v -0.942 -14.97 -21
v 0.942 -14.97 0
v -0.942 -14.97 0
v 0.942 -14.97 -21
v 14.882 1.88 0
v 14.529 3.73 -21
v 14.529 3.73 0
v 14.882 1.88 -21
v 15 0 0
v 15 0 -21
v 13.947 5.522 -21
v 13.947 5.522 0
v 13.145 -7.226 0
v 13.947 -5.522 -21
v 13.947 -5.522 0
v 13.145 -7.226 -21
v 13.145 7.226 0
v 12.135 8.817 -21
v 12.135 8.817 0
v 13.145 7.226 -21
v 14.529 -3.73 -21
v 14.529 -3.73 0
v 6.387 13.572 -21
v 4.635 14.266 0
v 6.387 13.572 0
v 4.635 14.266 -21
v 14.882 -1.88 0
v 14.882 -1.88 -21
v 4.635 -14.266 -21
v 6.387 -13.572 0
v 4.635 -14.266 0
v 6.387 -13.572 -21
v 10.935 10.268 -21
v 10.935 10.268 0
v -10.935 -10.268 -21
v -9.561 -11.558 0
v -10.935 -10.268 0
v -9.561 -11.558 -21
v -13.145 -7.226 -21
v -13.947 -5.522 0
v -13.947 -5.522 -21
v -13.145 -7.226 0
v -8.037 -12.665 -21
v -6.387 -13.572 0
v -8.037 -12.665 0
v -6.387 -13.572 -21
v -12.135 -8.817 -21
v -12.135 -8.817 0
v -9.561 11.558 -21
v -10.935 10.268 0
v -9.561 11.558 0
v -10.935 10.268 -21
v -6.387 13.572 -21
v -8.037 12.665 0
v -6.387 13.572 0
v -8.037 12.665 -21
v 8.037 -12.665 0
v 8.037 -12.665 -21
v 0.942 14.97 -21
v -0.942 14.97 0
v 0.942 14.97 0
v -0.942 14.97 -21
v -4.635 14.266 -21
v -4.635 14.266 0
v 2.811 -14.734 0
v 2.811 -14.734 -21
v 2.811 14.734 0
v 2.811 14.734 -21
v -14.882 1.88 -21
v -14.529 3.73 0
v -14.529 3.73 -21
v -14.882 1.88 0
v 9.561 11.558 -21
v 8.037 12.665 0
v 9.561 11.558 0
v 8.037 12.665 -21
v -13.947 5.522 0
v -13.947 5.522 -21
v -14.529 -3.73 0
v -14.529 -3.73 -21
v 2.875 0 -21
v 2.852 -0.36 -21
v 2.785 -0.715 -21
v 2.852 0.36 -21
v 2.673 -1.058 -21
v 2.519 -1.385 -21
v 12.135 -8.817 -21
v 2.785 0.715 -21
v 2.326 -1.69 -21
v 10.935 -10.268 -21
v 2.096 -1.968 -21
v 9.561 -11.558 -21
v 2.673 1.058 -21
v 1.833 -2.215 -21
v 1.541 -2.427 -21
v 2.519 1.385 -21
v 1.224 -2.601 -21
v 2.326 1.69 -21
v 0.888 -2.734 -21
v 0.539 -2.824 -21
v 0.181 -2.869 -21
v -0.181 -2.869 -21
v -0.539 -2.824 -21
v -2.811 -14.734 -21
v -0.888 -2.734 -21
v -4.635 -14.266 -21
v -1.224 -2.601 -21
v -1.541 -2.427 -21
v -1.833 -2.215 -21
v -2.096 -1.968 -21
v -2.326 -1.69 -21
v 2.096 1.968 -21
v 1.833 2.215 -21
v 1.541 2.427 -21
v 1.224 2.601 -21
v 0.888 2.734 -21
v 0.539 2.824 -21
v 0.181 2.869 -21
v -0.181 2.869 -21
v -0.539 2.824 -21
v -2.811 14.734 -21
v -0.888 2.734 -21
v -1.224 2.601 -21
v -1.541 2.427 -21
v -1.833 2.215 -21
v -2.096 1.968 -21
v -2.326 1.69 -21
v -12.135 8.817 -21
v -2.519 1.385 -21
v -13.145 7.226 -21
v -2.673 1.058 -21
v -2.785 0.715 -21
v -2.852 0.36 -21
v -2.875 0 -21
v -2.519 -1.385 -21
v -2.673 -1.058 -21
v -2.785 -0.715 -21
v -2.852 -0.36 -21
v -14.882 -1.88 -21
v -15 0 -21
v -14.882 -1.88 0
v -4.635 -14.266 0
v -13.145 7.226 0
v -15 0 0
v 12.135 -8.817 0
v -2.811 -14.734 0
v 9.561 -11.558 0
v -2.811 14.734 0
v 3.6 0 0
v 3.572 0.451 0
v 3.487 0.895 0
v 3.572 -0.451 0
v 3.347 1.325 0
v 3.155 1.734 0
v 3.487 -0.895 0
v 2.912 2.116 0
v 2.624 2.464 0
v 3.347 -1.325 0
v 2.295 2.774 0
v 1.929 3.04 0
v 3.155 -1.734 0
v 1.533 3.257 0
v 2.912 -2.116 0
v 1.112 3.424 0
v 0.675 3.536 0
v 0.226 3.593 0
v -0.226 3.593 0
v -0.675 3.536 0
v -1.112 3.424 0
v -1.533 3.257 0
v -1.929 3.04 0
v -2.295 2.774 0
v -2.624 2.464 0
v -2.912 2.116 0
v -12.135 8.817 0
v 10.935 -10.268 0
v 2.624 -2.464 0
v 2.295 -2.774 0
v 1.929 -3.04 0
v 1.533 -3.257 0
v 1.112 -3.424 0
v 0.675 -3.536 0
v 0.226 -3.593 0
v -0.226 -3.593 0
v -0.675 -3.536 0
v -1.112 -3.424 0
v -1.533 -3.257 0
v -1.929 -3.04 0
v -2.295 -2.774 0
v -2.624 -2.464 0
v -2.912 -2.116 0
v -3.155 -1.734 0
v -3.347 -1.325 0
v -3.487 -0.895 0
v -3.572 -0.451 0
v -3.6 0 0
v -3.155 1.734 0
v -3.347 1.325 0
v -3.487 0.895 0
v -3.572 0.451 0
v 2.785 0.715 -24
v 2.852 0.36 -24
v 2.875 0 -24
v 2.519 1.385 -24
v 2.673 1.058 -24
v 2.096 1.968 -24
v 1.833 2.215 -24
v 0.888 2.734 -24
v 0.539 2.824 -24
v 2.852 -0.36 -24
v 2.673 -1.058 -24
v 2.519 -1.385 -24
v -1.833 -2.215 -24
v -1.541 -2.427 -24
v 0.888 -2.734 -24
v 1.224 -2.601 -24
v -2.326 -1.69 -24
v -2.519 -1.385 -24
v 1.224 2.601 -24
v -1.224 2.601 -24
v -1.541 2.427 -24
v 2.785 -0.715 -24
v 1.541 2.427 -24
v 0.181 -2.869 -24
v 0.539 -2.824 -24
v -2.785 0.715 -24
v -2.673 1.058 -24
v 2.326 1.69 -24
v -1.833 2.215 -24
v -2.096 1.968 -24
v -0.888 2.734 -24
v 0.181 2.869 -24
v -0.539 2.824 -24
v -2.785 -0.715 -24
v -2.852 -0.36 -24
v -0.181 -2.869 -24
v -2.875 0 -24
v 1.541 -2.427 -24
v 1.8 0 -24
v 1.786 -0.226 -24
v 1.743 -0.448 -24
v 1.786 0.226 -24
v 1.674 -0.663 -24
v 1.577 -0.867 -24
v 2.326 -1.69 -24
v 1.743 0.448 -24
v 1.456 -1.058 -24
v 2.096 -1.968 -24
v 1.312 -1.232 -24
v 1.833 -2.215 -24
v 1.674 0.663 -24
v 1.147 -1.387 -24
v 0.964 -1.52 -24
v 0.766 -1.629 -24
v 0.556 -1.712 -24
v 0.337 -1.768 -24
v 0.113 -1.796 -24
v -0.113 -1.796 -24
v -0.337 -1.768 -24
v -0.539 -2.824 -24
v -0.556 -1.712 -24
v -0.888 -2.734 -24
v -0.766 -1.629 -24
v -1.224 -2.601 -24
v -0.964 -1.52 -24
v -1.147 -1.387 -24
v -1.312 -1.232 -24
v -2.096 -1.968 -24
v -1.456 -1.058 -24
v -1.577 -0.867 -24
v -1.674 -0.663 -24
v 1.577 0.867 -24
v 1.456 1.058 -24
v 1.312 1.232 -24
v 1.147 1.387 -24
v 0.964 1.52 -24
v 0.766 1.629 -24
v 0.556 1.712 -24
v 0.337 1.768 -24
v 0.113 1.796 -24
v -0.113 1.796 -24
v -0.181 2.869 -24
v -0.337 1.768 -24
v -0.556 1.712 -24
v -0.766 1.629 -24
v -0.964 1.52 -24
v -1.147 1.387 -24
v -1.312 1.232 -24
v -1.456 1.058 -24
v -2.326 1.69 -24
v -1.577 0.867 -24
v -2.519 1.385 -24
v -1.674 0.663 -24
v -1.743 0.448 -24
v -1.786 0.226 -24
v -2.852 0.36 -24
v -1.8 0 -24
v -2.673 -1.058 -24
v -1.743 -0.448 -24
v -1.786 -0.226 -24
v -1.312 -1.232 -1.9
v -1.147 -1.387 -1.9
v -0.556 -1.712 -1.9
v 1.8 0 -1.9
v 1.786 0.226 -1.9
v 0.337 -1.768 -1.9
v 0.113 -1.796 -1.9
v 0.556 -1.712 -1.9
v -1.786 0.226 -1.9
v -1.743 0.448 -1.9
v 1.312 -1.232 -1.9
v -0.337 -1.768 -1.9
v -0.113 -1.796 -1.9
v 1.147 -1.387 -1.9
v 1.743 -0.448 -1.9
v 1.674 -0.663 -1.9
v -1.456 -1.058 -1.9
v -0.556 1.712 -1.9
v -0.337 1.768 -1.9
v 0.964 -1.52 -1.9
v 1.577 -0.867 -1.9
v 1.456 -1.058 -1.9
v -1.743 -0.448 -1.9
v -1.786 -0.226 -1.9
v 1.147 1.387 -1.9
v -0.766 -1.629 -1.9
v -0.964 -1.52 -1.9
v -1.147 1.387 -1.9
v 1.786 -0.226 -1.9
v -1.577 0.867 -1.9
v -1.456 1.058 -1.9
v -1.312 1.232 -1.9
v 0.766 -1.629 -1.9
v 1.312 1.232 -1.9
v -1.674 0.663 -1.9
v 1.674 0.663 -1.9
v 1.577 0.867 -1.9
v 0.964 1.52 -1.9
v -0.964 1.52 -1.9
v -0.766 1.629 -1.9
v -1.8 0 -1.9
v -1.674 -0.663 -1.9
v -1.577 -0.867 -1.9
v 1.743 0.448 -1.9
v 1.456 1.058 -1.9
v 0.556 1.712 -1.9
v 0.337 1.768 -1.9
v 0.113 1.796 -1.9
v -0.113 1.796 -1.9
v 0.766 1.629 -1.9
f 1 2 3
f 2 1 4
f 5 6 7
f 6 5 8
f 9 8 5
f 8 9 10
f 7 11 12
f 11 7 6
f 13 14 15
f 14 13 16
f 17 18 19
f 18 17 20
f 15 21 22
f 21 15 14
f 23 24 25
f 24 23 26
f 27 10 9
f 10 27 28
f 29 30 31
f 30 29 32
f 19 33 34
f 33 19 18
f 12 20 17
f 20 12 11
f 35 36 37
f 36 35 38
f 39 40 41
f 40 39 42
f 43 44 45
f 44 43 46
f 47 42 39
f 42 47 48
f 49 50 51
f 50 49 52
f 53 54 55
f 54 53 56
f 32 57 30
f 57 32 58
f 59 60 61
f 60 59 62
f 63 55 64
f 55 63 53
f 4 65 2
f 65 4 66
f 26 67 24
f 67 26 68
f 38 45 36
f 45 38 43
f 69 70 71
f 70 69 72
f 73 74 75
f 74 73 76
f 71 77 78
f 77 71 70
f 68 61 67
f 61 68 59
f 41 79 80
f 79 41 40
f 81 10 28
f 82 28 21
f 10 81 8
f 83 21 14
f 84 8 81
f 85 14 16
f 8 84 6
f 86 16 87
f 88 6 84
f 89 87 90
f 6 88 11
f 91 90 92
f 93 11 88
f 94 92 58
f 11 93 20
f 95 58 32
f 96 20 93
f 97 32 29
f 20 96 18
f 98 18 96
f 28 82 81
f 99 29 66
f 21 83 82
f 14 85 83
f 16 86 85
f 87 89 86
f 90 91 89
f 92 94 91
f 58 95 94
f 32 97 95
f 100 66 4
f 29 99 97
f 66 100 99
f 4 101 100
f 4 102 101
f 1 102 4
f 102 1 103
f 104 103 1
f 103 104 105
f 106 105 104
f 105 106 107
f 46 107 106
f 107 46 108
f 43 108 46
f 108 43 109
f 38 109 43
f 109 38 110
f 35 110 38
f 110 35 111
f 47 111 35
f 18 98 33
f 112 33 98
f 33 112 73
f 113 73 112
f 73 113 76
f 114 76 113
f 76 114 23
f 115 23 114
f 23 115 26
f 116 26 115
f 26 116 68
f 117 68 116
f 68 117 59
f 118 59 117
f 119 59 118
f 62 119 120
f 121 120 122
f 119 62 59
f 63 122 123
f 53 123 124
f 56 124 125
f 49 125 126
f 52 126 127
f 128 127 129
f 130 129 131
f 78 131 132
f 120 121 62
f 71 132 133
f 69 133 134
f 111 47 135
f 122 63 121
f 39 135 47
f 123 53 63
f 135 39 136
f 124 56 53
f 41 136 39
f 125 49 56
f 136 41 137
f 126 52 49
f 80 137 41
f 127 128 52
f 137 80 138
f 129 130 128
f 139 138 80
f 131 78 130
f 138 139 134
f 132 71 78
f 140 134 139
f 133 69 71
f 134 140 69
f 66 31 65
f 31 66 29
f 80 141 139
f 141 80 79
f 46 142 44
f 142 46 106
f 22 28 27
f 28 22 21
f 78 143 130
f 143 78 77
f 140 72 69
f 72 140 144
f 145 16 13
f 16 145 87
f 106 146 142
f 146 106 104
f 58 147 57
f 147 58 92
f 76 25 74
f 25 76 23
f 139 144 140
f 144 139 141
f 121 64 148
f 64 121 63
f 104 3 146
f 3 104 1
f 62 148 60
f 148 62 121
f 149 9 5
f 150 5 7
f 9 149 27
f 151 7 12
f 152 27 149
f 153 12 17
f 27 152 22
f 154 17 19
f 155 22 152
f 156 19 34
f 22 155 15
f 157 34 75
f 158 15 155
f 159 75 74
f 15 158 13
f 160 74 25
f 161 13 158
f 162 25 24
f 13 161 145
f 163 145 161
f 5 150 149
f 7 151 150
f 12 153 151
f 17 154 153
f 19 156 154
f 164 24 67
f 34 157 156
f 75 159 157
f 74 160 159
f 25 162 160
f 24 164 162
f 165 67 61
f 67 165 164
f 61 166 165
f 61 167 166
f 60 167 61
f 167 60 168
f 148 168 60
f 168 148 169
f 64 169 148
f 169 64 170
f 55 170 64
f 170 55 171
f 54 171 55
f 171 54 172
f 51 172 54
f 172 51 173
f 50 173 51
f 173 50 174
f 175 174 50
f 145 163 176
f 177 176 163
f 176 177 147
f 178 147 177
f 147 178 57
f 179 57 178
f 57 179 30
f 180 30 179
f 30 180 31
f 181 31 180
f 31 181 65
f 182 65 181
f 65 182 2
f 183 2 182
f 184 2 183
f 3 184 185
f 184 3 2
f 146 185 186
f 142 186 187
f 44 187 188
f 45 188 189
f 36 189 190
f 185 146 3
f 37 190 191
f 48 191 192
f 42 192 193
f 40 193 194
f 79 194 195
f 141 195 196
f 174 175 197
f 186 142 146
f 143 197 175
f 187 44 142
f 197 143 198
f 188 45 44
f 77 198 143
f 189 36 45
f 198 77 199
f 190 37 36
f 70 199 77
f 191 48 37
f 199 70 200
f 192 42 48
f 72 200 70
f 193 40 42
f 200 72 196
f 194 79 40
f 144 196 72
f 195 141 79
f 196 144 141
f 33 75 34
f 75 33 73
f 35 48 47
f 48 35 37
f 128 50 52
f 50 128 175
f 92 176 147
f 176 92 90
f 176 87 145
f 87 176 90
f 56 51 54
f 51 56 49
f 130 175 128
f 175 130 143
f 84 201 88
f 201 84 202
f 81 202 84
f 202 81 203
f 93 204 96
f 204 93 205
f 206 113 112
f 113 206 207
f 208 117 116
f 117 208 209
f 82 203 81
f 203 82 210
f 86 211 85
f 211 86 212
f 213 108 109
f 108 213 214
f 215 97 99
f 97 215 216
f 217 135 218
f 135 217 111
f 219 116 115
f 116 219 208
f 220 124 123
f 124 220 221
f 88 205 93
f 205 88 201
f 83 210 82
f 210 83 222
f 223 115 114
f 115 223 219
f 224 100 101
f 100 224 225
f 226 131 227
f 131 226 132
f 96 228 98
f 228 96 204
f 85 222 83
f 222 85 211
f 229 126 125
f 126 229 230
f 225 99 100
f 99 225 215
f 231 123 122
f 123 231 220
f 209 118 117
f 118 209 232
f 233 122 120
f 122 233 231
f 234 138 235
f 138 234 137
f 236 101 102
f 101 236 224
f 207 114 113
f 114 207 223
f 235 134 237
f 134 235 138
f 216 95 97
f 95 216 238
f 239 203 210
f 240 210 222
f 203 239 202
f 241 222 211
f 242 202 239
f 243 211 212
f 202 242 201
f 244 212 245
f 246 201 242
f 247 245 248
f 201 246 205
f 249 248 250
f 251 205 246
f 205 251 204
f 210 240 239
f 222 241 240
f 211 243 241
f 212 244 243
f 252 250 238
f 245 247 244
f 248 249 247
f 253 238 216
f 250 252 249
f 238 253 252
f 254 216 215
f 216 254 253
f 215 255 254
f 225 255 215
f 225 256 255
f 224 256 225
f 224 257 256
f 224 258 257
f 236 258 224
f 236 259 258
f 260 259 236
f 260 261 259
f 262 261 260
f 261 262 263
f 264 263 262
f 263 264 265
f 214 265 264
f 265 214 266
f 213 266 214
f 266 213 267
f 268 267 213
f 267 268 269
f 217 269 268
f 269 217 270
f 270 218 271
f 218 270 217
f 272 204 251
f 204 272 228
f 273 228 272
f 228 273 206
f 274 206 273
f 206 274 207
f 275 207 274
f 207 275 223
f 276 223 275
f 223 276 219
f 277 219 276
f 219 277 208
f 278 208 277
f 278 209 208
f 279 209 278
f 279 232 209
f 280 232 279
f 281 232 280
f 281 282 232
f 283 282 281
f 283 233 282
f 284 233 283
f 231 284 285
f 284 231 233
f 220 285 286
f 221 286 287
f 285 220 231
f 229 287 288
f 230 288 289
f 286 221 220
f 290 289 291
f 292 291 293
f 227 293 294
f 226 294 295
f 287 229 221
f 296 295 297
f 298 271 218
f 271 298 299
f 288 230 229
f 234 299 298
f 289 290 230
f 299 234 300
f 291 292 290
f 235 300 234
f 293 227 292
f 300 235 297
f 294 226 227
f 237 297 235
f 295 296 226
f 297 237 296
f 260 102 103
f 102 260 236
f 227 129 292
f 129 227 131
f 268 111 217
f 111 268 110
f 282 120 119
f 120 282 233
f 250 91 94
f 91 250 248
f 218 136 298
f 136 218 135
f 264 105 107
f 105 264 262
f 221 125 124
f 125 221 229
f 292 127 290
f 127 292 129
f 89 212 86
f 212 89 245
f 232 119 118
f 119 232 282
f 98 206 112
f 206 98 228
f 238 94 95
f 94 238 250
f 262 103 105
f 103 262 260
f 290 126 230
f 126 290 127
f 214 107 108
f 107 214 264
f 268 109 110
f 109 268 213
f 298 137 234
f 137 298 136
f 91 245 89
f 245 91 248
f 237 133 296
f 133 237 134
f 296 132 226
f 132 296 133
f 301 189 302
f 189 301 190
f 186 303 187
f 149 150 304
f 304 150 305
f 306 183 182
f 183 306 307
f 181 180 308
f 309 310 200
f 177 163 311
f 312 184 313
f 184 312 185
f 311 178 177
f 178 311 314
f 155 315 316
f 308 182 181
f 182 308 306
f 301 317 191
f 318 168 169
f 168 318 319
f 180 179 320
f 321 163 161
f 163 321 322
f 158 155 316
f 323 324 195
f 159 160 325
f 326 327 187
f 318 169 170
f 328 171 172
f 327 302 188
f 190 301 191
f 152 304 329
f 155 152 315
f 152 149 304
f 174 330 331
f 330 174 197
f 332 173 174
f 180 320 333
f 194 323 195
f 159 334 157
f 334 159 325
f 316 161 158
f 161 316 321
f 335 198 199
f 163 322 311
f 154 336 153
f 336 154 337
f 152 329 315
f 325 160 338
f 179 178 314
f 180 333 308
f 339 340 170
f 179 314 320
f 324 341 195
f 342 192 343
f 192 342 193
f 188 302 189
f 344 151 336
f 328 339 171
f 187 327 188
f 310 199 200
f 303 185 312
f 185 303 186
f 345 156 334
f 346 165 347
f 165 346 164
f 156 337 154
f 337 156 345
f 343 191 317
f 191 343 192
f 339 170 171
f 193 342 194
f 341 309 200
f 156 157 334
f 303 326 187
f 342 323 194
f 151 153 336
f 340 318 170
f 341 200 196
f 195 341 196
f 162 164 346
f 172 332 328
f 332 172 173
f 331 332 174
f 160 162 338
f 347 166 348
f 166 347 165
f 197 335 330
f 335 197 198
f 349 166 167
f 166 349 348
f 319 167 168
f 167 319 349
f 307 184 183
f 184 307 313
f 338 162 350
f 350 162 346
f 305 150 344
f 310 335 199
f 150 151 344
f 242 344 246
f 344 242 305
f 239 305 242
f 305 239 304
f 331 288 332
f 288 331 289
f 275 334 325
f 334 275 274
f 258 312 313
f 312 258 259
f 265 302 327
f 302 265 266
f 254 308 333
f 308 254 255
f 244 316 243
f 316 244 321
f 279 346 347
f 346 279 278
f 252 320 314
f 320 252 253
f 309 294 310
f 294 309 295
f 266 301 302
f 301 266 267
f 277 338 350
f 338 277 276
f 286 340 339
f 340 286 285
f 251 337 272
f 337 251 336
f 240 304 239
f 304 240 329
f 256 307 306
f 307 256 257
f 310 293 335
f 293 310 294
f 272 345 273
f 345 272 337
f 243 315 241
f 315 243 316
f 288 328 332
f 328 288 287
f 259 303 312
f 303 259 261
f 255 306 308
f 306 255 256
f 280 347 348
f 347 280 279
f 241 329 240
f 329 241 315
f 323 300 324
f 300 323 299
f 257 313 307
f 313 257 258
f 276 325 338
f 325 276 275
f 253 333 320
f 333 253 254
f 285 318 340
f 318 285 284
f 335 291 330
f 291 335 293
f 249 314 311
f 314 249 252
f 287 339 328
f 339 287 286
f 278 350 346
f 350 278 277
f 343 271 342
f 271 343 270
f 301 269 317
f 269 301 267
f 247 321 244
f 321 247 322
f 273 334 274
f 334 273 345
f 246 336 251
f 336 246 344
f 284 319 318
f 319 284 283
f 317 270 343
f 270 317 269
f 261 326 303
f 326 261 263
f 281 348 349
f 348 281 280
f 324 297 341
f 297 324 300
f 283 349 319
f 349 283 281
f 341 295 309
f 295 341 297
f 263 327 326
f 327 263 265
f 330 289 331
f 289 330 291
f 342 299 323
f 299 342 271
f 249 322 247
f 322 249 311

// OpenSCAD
$fn = 50;

difference() {
	union() {
		translate(v = [0, 0, -21.0]) {
			cylinder(h = 21, r = 15.0);
		}
		#translate(v = [0, 0, -24.0]) {
			cylinder(h = 24, r = 2.875);
		}
	}
	union() {
		translate(v = [0, 0, 0]) {
			rotate(a = [0, 0, 0]) {
				difference() {
					union() {
						translate(v = [0, 0, -24.0]) {
							cylinder(h = 24, r = 1.5);
						}
						translate(v = [0, 0, -1.9]) {
							cylinder(h = 1.9, r1 = 1.8, r2 = 3.6);
						}
						translate(v = [0, 0, -24.0]) {
							cylinder(h = 24, r = 1.8);
						}
						translate(v = [0, 0, -24.0]) {
							cylinder(h = 24, r = 1.5);
						}
					}
					union();
				}
			}
		}
	}
}
